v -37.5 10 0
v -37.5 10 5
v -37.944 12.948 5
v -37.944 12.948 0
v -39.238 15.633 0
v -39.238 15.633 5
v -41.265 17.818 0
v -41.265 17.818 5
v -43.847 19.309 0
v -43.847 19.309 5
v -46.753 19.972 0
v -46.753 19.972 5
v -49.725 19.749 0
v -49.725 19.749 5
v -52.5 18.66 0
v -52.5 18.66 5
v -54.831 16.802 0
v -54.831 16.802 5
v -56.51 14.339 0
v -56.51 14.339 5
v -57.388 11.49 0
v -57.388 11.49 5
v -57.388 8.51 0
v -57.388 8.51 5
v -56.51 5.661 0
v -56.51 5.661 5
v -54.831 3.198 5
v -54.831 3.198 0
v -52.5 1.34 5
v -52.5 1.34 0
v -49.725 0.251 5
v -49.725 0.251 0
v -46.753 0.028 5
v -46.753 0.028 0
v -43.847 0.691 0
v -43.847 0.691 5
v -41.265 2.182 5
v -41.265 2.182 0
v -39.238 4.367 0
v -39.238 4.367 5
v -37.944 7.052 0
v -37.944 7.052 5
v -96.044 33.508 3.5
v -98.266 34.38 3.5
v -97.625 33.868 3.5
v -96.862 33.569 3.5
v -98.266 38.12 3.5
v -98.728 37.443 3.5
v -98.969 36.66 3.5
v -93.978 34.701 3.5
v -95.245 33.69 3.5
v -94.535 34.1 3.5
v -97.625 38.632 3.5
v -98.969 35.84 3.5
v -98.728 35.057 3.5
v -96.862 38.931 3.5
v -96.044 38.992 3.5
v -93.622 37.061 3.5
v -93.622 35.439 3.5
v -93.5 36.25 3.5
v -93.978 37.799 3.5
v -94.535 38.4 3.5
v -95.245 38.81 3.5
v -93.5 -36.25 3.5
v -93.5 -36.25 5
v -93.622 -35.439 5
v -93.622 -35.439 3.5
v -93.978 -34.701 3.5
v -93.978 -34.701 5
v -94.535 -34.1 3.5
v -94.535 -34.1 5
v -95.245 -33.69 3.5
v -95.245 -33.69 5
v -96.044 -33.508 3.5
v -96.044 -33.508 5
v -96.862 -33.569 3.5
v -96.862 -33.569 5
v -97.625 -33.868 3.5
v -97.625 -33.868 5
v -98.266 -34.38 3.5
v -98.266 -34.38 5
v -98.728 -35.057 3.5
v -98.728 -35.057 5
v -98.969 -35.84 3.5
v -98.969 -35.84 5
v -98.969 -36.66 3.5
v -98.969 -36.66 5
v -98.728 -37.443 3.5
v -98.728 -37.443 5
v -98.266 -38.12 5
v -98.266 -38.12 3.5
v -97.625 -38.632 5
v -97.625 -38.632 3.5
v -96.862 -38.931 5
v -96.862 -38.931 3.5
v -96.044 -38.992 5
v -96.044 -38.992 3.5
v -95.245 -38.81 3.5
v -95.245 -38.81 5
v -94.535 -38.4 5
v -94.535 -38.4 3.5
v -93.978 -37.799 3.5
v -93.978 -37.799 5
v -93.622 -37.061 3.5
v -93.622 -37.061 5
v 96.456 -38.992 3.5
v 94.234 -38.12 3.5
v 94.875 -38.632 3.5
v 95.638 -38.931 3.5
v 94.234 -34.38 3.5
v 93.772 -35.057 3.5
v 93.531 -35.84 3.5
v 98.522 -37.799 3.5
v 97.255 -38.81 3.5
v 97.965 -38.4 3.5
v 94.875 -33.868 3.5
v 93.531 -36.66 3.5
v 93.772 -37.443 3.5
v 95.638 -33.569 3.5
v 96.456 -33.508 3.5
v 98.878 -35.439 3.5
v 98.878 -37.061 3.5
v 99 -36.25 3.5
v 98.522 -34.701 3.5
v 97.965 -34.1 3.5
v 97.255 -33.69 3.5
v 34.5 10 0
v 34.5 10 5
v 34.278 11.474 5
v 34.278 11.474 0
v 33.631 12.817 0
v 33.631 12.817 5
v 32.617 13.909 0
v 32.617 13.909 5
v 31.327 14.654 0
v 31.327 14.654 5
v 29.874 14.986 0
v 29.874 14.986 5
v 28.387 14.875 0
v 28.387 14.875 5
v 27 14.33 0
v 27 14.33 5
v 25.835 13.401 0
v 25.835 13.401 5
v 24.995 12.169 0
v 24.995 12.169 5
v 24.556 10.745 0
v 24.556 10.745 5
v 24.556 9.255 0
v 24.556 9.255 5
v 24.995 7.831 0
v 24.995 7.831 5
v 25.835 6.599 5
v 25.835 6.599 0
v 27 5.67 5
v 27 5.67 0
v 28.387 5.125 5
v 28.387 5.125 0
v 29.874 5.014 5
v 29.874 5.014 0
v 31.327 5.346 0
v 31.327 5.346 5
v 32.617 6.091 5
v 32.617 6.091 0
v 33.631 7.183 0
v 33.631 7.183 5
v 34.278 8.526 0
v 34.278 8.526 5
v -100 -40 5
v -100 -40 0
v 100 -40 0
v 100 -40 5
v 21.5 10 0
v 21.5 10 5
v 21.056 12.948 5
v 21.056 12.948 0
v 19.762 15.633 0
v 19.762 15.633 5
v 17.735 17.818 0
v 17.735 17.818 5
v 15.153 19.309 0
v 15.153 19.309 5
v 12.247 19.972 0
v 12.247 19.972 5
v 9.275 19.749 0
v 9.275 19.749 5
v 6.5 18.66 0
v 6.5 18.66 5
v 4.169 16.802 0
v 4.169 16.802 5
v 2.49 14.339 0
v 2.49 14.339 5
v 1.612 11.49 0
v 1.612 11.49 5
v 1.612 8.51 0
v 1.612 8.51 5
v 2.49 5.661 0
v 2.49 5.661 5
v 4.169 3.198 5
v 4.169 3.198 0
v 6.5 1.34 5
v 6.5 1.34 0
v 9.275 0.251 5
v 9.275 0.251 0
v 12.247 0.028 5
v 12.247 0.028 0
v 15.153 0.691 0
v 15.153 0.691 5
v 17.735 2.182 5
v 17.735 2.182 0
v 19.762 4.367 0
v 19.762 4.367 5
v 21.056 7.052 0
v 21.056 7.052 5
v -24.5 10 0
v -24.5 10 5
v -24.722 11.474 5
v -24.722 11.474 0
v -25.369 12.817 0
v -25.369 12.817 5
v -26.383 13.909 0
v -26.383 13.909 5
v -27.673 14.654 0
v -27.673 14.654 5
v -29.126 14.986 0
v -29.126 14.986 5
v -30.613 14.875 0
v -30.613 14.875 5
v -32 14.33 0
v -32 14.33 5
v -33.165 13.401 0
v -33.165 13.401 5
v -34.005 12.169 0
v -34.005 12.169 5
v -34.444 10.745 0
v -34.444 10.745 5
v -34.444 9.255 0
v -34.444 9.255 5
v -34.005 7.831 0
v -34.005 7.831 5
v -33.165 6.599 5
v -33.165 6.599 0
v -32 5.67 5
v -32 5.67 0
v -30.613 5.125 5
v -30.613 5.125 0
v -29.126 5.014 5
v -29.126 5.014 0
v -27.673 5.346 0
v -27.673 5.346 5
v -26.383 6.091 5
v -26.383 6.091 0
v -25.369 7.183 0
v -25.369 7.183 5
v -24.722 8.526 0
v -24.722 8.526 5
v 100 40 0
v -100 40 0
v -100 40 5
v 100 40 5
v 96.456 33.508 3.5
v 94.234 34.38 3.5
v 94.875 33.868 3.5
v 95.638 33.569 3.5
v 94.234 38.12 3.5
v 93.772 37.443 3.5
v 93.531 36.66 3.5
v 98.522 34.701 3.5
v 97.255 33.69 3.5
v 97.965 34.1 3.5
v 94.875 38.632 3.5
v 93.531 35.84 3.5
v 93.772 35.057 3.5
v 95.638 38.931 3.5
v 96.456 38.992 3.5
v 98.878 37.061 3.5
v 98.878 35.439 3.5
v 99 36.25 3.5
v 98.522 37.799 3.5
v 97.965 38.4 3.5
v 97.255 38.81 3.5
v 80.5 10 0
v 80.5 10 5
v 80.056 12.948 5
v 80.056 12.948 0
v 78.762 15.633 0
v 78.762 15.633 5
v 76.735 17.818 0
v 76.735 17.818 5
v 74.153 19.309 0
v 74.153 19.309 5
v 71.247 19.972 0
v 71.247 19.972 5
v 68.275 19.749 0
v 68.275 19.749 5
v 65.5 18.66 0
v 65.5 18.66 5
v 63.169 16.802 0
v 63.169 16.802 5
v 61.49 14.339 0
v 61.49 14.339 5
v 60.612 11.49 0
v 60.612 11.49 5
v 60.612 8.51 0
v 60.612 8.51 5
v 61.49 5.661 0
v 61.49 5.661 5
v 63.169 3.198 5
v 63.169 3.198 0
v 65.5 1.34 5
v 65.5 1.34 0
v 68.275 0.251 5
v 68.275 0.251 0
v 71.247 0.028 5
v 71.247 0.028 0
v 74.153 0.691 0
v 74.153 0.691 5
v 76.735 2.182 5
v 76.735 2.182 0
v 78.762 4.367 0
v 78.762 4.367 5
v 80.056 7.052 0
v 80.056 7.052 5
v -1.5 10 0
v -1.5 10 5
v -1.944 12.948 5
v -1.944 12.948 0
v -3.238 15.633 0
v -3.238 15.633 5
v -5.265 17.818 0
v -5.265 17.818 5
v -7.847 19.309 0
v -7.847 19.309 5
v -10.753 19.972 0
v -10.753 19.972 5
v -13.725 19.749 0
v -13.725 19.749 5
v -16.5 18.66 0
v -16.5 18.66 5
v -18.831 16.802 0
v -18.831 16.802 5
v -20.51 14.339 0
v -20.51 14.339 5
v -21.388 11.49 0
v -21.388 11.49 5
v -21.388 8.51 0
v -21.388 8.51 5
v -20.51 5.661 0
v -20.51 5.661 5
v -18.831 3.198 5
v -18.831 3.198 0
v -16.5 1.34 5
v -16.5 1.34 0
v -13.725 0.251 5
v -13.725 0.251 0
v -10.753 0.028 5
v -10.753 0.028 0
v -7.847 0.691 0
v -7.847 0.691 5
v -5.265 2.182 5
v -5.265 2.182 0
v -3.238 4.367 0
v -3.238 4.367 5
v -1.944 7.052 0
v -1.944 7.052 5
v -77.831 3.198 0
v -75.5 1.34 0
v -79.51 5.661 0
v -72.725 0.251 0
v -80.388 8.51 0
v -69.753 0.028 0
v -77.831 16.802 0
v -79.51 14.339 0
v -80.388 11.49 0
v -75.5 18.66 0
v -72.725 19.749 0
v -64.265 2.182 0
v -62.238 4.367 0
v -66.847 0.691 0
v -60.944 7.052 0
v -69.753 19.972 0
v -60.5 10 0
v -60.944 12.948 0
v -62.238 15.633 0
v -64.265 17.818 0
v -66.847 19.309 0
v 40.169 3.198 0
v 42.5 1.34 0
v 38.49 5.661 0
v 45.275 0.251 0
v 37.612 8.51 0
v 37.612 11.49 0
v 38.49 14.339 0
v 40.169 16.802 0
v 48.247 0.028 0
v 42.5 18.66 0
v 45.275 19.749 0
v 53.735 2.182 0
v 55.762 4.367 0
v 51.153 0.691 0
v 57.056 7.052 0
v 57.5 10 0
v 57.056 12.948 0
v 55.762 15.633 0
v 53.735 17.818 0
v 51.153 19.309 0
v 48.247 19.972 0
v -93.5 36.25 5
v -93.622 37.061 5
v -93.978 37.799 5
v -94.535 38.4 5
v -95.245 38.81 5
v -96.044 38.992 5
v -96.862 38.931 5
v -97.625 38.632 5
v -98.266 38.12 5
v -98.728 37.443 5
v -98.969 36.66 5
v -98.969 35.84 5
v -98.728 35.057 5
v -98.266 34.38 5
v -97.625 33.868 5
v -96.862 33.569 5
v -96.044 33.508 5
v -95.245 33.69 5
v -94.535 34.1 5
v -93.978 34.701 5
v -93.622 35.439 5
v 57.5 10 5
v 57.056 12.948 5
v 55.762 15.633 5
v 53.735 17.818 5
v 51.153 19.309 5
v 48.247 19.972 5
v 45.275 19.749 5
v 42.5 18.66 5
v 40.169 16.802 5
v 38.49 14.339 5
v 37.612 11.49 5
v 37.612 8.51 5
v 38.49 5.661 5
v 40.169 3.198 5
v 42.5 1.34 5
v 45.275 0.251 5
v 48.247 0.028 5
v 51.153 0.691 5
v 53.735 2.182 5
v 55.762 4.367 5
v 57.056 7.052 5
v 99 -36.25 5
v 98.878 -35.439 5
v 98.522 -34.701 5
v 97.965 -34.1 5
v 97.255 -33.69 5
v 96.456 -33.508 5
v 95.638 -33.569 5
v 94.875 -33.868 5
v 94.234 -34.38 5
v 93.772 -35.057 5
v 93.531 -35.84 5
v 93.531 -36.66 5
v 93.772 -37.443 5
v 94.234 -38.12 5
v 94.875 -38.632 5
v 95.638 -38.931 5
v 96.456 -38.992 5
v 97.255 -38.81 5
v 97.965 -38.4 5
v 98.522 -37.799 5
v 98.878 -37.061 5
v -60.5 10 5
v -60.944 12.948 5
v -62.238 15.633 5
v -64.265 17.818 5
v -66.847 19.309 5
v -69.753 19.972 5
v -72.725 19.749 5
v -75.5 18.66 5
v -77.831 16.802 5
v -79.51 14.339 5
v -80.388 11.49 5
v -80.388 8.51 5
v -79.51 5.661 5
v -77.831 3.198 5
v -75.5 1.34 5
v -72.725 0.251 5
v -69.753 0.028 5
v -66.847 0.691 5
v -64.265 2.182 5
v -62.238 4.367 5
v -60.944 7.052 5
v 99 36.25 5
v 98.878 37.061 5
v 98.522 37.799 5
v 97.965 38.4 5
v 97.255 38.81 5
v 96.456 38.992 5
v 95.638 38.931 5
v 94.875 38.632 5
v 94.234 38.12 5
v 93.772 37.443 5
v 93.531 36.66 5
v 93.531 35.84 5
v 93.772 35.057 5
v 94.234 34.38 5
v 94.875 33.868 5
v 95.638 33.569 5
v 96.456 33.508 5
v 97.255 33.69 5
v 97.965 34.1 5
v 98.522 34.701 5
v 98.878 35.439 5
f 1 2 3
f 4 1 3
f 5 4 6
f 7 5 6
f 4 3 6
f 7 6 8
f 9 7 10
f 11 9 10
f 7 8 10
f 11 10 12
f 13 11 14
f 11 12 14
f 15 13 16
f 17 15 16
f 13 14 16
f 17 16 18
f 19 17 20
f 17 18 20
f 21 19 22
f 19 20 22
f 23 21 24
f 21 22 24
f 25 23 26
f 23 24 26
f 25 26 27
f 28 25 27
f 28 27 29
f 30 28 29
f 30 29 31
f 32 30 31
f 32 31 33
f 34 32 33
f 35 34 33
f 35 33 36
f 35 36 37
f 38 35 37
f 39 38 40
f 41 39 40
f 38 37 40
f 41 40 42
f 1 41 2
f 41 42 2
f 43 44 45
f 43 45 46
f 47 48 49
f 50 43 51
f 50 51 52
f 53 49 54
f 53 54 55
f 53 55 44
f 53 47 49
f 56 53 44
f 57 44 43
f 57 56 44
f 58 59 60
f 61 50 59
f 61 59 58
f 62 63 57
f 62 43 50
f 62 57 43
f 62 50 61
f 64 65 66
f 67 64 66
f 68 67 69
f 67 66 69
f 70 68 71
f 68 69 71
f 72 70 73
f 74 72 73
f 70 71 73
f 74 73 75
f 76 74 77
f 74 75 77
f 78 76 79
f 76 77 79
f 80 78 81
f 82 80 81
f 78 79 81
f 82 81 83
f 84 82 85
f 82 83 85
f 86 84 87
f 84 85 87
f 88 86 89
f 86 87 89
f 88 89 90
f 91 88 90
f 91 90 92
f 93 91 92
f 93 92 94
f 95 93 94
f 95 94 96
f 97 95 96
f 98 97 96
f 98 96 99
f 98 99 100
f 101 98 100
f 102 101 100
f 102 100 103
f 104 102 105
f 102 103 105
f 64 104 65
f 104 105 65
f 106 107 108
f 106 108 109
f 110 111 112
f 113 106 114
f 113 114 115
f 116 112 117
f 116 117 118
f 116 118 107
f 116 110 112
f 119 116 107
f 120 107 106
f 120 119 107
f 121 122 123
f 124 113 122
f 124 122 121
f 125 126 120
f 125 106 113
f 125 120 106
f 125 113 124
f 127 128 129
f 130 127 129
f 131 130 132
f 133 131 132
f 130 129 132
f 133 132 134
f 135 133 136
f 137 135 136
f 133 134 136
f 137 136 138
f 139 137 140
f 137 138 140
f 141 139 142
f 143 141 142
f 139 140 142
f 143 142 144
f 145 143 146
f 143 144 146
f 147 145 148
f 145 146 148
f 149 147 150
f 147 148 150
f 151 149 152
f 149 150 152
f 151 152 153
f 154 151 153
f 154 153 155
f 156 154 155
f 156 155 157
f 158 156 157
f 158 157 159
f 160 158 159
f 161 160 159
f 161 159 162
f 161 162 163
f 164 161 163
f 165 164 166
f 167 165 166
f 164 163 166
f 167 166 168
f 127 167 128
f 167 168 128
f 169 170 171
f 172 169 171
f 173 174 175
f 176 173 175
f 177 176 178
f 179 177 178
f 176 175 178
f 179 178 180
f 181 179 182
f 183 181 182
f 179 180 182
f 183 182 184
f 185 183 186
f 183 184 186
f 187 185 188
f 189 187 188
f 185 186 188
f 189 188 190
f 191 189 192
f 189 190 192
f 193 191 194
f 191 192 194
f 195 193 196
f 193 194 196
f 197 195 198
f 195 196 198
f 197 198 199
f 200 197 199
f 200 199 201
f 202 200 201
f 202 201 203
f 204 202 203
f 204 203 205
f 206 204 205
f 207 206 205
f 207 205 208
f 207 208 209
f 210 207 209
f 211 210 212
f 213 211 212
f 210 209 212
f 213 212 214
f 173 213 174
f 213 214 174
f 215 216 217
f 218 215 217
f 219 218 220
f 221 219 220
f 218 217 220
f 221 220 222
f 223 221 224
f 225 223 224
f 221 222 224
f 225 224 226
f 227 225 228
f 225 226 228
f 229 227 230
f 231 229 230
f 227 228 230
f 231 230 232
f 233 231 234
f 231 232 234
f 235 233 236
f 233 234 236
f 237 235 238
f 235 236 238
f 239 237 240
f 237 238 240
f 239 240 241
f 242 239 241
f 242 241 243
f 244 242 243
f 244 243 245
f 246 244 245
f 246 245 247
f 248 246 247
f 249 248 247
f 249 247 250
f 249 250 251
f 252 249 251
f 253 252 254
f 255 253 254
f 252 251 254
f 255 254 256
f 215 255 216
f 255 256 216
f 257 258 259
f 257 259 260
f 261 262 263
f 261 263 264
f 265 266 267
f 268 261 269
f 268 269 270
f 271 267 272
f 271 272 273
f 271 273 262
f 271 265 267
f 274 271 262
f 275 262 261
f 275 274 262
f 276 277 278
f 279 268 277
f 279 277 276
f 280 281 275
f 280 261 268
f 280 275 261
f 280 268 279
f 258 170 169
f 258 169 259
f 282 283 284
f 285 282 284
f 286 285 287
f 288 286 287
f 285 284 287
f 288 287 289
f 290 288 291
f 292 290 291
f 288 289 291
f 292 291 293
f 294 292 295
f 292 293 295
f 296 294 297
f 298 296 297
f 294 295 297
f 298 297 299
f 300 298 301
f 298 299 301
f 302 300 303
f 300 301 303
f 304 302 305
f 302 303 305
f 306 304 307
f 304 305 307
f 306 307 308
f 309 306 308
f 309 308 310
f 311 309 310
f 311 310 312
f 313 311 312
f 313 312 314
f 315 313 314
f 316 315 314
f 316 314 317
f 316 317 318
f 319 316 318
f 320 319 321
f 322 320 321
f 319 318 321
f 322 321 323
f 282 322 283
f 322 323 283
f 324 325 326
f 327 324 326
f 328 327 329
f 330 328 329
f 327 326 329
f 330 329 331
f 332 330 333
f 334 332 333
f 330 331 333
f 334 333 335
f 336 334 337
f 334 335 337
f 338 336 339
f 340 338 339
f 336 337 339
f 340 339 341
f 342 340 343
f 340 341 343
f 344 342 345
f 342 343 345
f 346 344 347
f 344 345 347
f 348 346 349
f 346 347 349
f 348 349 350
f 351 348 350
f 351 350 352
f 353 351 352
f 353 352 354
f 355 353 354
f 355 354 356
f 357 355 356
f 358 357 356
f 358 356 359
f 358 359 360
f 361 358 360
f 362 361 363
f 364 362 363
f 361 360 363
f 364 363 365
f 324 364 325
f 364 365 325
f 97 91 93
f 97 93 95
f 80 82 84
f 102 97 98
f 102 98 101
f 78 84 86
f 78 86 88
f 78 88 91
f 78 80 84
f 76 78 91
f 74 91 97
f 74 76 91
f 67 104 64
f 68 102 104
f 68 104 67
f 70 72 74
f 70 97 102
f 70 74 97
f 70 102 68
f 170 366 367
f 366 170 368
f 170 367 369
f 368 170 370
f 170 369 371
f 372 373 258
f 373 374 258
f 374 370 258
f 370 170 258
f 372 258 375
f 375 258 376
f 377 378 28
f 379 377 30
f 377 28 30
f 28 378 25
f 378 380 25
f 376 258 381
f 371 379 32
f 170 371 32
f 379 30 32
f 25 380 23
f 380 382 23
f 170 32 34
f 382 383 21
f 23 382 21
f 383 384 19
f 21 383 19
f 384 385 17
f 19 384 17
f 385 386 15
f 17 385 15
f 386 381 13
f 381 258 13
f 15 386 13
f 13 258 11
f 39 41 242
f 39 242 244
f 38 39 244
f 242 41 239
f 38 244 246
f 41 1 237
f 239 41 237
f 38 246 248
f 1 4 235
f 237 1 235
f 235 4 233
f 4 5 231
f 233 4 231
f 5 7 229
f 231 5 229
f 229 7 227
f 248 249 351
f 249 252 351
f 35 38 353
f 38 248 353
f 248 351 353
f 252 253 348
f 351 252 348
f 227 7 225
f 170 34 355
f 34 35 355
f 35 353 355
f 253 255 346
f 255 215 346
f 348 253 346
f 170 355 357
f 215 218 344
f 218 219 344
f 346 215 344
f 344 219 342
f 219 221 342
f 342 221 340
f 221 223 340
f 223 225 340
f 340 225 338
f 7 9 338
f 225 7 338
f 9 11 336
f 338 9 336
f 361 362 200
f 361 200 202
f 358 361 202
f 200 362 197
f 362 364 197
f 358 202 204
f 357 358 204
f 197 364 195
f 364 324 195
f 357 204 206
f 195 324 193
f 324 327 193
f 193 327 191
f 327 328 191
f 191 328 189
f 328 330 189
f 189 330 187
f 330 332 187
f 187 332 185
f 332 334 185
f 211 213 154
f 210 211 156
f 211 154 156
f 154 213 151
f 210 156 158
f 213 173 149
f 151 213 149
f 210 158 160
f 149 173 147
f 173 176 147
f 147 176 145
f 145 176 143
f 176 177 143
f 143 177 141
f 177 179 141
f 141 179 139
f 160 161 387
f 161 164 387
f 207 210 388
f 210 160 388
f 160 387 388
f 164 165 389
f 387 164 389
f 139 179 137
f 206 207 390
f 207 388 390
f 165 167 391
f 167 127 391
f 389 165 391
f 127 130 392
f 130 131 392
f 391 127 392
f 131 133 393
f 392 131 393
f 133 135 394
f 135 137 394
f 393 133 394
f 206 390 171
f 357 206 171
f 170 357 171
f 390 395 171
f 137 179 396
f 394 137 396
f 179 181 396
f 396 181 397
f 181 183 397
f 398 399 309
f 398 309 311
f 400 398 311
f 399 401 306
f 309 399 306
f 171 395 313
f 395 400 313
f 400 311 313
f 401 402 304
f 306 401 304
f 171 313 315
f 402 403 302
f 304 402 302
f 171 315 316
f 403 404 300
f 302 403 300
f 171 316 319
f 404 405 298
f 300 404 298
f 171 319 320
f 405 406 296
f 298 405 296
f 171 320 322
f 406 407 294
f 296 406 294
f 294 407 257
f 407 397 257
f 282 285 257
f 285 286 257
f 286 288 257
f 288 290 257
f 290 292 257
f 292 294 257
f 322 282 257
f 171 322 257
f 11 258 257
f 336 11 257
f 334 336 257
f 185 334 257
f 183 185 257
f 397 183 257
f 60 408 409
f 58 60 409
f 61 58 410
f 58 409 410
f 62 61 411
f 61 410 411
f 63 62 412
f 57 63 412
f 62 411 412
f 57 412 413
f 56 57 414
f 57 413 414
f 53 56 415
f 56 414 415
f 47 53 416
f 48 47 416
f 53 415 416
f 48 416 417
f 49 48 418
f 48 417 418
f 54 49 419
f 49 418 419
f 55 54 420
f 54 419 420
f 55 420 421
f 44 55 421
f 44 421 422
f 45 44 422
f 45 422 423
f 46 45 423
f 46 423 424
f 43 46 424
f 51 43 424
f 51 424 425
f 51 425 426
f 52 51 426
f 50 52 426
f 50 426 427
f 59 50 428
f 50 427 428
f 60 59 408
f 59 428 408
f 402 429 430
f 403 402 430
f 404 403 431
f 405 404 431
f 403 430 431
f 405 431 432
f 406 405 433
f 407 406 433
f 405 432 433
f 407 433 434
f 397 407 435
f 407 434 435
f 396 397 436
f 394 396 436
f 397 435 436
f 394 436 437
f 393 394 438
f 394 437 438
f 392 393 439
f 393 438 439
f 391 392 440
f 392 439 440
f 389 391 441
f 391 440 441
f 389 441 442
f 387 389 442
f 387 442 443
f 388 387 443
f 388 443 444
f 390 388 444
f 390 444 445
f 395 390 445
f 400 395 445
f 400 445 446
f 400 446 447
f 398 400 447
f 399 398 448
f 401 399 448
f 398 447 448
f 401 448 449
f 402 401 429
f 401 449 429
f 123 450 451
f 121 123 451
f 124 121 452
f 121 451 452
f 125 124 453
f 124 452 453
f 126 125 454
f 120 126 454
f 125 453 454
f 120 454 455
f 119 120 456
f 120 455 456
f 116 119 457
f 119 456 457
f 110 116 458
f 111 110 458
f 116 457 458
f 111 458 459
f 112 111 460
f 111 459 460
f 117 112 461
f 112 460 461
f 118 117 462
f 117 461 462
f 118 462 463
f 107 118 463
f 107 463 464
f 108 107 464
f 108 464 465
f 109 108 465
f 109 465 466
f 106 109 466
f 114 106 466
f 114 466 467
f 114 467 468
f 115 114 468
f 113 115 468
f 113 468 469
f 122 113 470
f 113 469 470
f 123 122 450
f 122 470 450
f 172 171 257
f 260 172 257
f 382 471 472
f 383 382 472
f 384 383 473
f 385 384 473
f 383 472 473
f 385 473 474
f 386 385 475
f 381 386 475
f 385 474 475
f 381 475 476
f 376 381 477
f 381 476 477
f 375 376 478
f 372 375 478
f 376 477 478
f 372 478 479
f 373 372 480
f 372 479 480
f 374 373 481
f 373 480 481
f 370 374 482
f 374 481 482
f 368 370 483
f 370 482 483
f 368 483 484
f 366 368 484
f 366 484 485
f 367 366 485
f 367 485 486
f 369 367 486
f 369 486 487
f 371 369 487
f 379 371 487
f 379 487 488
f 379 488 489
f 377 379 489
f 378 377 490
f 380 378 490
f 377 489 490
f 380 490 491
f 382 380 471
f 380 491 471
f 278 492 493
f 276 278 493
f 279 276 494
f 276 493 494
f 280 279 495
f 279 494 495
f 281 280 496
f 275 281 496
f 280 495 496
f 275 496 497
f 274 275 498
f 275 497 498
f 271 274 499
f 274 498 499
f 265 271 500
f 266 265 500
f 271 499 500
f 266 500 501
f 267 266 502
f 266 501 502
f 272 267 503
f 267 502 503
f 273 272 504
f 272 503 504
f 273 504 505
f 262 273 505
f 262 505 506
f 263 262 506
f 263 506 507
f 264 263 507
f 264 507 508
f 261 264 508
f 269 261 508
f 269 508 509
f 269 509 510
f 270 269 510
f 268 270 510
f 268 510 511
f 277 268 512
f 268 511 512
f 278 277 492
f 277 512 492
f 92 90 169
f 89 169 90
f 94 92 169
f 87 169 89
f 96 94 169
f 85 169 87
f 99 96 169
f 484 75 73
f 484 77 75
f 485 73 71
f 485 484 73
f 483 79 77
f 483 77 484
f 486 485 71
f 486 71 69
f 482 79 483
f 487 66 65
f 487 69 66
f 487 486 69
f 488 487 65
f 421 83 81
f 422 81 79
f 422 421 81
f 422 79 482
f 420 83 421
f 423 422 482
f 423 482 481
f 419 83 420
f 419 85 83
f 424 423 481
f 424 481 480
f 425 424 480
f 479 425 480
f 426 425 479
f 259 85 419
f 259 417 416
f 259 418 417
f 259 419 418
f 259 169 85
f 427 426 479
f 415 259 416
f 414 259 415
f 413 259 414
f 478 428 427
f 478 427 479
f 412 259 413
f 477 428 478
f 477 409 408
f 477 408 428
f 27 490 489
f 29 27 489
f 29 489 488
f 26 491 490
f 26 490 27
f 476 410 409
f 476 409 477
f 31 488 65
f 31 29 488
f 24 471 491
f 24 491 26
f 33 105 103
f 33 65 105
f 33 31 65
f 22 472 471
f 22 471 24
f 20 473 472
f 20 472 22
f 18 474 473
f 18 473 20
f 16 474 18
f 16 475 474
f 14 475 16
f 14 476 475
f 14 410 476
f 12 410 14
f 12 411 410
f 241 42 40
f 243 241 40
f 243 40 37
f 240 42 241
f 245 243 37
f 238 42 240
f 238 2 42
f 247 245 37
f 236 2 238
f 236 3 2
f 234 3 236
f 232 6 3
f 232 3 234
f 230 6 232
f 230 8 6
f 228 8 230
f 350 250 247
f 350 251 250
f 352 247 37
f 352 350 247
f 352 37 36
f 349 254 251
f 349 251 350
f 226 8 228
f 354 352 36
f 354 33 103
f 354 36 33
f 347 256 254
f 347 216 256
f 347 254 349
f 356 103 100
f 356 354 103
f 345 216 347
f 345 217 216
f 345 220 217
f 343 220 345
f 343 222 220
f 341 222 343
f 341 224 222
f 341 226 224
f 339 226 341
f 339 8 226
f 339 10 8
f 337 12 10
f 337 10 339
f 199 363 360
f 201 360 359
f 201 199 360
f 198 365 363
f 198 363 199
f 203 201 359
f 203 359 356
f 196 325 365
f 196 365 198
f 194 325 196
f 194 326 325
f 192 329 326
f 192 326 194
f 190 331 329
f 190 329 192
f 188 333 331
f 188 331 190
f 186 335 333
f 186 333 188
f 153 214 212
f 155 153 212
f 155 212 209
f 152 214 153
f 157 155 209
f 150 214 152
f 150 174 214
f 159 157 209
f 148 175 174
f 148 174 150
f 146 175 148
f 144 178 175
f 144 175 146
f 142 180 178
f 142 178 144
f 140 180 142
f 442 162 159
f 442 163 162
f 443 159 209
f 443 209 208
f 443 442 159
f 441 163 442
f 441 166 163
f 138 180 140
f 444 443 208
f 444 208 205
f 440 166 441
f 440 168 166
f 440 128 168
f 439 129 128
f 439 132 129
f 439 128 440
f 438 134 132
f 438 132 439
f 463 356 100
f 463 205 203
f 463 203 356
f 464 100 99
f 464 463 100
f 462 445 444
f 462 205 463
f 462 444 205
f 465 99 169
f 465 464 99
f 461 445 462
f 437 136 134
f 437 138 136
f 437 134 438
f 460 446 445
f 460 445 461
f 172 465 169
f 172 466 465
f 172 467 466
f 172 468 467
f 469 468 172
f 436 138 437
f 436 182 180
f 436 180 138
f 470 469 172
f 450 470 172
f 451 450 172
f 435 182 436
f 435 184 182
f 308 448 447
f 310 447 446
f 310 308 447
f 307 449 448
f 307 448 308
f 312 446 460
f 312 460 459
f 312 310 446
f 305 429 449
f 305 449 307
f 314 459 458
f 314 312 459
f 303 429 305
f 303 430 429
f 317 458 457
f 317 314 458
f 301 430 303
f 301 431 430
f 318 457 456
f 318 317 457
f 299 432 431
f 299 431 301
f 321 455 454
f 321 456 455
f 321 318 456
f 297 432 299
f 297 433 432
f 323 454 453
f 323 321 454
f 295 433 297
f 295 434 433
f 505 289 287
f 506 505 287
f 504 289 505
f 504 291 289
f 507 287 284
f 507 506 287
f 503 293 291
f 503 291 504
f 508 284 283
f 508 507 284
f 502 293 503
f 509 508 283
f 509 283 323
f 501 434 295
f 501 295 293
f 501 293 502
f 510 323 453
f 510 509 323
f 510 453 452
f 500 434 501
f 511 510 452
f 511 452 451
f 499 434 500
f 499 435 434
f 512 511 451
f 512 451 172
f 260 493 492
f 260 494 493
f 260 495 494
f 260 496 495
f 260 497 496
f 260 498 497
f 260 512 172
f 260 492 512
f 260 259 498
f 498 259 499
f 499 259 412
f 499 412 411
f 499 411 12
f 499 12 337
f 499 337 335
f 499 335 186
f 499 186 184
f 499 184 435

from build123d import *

# Parameters (mm, degrees)
CROQUIS1_W              = 200
CROQUIS1_H              = 80
SALIENTE_EXTRUIR1_DEPTH = 5
CROQUIS2_R              = 2.75
CORTAR_EXTRUIR1_DEPTH   = 1.5
CROQUIS4_R              = 10
CROQUIS4_R_2            = 5
CORTAR_EXTRUIR3_DEPTH   = 5


with BuildPart() as part:
    # Croquis1 → Saliente-Extruir1 (new body)
    with BuildSketch(Plane.XY):
        Rectangle(CROQUIS1_W, CROQUIS1_H)
    extrude(amount=SALIENTE_EXTRUIR1_DEPTH)

    # Croquis2 → Cortar-Extruir1 (cut)
    with BuildSketch(Plane.XY.offset(5)):
        with Locations((-96.25, 36.25)):
            Circle(CROQUIS2_R)
        with Locations((96.25, 36.25)):
            Circle(CROQUIS2_R)
        with Locations((96.25, -36.25)):
            Circle(CROQUIS2_R)
        with Locations((-96.25, -36.25)):
            Circle(CROQUIS2_R)
    extrude(amount=-CORTAR_EXTRUIR1_DEPTH, mode=Mode.SUBTRACT)

    # Croquis4 → Cortar-Extruir3 (cut)
    with BuildSketch(Plane.XY.offset(5)):
        with Locations((-70.5, 10)):
            Circle(CROQUIS4_R)
        with Locations((-47.5, 10)):
            Circle(CROQUIS4_R)
        with Locations((-29.5, 10)):
            Circle(CROQUIS4_R_2)
        with Locations((-11.5, 10)):
            Circle(CROQUIS4_R)
        with Locations((11.5, 10)):
            Circle(CROQUIS4_R)
        with Locations((29.5, 10)):
            Circle(CROQUIS4_R_2)
        with Locations((47.5, 10)):
            Circle(CROQUIS4_R)
        with Locations((70.5, 10)):
            Circle(CROQUIS4_R)
    extrude(amount=-CORTAR_EXTRUIR3_DEPTH, mode=Mode.SUBTRACT)


solid = part.part
